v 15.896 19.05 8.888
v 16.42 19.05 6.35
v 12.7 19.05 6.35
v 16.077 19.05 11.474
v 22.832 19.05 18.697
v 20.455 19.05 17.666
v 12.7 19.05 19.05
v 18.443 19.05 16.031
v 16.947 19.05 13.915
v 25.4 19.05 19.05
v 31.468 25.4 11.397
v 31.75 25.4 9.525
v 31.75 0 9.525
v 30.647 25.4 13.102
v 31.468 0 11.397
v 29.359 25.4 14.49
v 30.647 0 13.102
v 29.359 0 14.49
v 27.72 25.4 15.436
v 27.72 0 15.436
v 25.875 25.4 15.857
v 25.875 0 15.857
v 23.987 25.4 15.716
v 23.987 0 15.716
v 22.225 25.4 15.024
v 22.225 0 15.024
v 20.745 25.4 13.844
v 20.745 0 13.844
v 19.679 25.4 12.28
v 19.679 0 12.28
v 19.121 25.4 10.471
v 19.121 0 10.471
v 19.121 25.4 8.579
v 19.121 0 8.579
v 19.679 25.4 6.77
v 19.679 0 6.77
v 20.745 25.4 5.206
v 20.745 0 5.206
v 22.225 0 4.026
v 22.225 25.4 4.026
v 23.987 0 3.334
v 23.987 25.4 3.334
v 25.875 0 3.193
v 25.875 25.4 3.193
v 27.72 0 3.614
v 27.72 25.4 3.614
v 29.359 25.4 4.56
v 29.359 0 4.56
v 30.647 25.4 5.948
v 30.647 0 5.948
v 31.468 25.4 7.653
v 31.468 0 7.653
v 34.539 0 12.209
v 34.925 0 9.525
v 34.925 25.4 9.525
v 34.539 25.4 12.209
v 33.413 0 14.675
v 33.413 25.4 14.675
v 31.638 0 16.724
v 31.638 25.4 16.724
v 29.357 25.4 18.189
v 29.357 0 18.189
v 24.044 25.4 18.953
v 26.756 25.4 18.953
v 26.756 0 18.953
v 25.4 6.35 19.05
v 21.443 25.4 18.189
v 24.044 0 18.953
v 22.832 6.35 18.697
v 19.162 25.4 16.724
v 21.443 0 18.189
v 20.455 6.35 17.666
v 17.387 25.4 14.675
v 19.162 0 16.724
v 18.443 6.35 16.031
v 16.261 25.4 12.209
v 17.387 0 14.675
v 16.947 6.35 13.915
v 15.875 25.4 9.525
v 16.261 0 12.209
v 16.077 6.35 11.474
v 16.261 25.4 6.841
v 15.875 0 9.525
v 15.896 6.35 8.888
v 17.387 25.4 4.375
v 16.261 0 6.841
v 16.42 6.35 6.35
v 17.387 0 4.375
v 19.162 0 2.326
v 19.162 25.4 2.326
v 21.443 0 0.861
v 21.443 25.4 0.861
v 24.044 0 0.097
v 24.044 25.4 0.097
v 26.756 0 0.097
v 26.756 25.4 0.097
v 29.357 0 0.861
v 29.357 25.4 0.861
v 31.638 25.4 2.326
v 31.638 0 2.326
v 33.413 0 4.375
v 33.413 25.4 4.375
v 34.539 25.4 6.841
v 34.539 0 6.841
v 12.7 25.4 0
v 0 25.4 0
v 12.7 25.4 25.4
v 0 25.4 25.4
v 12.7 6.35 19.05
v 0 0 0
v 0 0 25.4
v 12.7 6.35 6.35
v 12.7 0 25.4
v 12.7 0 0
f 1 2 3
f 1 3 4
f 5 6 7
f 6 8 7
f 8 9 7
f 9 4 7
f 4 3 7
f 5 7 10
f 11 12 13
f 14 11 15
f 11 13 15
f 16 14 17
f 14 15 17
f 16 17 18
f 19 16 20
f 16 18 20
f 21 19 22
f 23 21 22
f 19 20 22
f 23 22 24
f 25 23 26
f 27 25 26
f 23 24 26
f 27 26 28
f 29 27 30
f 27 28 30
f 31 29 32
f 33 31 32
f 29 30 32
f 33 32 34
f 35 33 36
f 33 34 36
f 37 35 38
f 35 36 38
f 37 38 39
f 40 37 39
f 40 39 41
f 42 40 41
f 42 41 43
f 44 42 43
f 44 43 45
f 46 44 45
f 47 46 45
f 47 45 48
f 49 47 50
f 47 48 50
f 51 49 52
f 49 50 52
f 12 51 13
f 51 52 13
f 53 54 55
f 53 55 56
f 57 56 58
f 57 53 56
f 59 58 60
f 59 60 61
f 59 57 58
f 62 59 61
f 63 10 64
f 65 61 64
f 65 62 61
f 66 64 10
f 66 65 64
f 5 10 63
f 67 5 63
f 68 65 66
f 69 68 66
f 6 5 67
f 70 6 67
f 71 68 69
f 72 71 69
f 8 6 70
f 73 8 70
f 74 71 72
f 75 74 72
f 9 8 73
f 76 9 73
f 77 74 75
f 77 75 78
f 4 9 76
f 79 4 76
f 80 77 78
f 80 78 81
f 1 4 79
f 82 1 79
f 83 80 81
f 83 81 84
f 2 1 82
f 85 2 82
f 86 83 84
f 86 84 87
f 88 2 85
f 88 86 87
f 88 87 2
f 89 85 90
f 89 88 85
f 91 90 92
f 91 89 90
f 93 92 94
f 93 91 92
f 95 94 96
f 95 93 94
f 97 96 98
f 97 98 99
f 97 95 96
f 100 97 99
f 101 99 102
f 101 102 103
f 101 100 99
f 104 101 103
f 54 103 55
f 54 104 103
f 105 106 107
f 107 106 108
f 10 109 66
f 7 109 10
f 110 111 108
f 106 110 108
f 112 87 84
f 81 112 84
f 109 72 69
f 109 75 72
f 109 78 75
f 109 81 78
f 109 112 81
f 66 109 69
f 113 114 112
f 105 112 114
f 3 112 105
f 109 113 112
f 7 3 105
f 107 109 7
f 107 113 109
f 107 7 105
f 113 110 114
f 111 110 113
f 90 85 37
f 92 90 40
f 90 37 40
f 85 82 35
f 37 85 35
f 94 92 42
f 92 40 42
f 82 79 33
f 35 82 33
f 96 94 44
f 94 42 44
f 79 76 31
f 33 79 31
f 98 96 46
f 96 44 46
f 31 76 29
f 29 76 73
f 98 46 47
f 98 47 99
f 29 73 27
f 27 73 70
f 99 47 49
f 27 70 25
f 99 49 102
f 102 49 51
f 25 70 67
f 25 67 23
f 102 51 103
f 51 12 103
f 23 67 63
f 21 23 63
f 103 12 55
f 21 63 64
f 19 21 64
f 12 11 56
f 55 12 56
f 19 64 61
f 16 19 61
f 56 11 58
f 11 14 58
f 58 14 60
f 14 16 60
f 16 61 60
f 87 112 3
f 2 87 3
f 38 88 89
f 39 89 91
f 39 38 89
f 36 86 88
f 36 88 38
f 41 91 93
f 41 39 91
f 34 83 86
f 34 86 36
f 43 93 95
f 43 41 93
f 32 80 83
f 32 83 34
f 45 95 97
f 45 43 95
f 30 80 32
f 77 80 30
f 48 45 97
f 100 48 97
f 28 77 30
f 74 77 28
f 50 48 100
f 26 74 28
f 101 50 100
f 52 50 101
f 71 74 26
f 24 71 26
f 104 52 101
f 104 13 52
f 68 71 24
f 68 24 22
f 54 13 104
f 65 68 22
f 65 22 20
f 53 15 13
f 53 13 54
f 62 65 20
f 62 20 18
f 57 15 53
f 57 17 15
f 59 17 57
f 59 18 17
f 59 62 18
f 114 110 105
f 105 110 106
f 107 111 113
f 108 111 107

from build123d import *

# Parameters (mm, degrees)
F0_W     = 25.4
F0_H     = 25.4
F1_DEPTH = 12.7
F2_W     = 12.7
F2_H     = 12.7
F3_DEPTH = 12.7
F4_R     = 9.525
F5_DEPTH = 25.4
F6_R     = 6.35
F7_DEPTH = 25.4


with BuildPart() as f1:
    # F0 (on Right) → F1 (new body)
    with BuildSketch(Plane.YZ):
        with Locations((12.7, 12.7)):
            Rectangle(F0_W, F0_H)
    extrude(amount=F1_DEPTH)

    # F2 (on face) → F3 (join)
    with BuildSketch(Plane.YZ.offset(12.7)):
        with Locations((12.7, 12.7)):
            Rectangle(F2_W, F2_H)
    extrude(amount=F3_DEPTH)

    # F4 (on Front) → F5 (join)
    with BuildSketch(Plane.XZ):
        with Locations((25.4, 9.525)):
            Circle(F4_R)
    extrude(amount=-F5_DEPTH)

    # F6 (on face) → F7 (cut)
    with BuildSketch(Plane.XZ):
        with Locations((25.4, 9.525)):
            Circle(F6_R)
    extrude(amount=-F7_DEPTH, mode=Mode.SUBTRACT)


solid = f1.part
